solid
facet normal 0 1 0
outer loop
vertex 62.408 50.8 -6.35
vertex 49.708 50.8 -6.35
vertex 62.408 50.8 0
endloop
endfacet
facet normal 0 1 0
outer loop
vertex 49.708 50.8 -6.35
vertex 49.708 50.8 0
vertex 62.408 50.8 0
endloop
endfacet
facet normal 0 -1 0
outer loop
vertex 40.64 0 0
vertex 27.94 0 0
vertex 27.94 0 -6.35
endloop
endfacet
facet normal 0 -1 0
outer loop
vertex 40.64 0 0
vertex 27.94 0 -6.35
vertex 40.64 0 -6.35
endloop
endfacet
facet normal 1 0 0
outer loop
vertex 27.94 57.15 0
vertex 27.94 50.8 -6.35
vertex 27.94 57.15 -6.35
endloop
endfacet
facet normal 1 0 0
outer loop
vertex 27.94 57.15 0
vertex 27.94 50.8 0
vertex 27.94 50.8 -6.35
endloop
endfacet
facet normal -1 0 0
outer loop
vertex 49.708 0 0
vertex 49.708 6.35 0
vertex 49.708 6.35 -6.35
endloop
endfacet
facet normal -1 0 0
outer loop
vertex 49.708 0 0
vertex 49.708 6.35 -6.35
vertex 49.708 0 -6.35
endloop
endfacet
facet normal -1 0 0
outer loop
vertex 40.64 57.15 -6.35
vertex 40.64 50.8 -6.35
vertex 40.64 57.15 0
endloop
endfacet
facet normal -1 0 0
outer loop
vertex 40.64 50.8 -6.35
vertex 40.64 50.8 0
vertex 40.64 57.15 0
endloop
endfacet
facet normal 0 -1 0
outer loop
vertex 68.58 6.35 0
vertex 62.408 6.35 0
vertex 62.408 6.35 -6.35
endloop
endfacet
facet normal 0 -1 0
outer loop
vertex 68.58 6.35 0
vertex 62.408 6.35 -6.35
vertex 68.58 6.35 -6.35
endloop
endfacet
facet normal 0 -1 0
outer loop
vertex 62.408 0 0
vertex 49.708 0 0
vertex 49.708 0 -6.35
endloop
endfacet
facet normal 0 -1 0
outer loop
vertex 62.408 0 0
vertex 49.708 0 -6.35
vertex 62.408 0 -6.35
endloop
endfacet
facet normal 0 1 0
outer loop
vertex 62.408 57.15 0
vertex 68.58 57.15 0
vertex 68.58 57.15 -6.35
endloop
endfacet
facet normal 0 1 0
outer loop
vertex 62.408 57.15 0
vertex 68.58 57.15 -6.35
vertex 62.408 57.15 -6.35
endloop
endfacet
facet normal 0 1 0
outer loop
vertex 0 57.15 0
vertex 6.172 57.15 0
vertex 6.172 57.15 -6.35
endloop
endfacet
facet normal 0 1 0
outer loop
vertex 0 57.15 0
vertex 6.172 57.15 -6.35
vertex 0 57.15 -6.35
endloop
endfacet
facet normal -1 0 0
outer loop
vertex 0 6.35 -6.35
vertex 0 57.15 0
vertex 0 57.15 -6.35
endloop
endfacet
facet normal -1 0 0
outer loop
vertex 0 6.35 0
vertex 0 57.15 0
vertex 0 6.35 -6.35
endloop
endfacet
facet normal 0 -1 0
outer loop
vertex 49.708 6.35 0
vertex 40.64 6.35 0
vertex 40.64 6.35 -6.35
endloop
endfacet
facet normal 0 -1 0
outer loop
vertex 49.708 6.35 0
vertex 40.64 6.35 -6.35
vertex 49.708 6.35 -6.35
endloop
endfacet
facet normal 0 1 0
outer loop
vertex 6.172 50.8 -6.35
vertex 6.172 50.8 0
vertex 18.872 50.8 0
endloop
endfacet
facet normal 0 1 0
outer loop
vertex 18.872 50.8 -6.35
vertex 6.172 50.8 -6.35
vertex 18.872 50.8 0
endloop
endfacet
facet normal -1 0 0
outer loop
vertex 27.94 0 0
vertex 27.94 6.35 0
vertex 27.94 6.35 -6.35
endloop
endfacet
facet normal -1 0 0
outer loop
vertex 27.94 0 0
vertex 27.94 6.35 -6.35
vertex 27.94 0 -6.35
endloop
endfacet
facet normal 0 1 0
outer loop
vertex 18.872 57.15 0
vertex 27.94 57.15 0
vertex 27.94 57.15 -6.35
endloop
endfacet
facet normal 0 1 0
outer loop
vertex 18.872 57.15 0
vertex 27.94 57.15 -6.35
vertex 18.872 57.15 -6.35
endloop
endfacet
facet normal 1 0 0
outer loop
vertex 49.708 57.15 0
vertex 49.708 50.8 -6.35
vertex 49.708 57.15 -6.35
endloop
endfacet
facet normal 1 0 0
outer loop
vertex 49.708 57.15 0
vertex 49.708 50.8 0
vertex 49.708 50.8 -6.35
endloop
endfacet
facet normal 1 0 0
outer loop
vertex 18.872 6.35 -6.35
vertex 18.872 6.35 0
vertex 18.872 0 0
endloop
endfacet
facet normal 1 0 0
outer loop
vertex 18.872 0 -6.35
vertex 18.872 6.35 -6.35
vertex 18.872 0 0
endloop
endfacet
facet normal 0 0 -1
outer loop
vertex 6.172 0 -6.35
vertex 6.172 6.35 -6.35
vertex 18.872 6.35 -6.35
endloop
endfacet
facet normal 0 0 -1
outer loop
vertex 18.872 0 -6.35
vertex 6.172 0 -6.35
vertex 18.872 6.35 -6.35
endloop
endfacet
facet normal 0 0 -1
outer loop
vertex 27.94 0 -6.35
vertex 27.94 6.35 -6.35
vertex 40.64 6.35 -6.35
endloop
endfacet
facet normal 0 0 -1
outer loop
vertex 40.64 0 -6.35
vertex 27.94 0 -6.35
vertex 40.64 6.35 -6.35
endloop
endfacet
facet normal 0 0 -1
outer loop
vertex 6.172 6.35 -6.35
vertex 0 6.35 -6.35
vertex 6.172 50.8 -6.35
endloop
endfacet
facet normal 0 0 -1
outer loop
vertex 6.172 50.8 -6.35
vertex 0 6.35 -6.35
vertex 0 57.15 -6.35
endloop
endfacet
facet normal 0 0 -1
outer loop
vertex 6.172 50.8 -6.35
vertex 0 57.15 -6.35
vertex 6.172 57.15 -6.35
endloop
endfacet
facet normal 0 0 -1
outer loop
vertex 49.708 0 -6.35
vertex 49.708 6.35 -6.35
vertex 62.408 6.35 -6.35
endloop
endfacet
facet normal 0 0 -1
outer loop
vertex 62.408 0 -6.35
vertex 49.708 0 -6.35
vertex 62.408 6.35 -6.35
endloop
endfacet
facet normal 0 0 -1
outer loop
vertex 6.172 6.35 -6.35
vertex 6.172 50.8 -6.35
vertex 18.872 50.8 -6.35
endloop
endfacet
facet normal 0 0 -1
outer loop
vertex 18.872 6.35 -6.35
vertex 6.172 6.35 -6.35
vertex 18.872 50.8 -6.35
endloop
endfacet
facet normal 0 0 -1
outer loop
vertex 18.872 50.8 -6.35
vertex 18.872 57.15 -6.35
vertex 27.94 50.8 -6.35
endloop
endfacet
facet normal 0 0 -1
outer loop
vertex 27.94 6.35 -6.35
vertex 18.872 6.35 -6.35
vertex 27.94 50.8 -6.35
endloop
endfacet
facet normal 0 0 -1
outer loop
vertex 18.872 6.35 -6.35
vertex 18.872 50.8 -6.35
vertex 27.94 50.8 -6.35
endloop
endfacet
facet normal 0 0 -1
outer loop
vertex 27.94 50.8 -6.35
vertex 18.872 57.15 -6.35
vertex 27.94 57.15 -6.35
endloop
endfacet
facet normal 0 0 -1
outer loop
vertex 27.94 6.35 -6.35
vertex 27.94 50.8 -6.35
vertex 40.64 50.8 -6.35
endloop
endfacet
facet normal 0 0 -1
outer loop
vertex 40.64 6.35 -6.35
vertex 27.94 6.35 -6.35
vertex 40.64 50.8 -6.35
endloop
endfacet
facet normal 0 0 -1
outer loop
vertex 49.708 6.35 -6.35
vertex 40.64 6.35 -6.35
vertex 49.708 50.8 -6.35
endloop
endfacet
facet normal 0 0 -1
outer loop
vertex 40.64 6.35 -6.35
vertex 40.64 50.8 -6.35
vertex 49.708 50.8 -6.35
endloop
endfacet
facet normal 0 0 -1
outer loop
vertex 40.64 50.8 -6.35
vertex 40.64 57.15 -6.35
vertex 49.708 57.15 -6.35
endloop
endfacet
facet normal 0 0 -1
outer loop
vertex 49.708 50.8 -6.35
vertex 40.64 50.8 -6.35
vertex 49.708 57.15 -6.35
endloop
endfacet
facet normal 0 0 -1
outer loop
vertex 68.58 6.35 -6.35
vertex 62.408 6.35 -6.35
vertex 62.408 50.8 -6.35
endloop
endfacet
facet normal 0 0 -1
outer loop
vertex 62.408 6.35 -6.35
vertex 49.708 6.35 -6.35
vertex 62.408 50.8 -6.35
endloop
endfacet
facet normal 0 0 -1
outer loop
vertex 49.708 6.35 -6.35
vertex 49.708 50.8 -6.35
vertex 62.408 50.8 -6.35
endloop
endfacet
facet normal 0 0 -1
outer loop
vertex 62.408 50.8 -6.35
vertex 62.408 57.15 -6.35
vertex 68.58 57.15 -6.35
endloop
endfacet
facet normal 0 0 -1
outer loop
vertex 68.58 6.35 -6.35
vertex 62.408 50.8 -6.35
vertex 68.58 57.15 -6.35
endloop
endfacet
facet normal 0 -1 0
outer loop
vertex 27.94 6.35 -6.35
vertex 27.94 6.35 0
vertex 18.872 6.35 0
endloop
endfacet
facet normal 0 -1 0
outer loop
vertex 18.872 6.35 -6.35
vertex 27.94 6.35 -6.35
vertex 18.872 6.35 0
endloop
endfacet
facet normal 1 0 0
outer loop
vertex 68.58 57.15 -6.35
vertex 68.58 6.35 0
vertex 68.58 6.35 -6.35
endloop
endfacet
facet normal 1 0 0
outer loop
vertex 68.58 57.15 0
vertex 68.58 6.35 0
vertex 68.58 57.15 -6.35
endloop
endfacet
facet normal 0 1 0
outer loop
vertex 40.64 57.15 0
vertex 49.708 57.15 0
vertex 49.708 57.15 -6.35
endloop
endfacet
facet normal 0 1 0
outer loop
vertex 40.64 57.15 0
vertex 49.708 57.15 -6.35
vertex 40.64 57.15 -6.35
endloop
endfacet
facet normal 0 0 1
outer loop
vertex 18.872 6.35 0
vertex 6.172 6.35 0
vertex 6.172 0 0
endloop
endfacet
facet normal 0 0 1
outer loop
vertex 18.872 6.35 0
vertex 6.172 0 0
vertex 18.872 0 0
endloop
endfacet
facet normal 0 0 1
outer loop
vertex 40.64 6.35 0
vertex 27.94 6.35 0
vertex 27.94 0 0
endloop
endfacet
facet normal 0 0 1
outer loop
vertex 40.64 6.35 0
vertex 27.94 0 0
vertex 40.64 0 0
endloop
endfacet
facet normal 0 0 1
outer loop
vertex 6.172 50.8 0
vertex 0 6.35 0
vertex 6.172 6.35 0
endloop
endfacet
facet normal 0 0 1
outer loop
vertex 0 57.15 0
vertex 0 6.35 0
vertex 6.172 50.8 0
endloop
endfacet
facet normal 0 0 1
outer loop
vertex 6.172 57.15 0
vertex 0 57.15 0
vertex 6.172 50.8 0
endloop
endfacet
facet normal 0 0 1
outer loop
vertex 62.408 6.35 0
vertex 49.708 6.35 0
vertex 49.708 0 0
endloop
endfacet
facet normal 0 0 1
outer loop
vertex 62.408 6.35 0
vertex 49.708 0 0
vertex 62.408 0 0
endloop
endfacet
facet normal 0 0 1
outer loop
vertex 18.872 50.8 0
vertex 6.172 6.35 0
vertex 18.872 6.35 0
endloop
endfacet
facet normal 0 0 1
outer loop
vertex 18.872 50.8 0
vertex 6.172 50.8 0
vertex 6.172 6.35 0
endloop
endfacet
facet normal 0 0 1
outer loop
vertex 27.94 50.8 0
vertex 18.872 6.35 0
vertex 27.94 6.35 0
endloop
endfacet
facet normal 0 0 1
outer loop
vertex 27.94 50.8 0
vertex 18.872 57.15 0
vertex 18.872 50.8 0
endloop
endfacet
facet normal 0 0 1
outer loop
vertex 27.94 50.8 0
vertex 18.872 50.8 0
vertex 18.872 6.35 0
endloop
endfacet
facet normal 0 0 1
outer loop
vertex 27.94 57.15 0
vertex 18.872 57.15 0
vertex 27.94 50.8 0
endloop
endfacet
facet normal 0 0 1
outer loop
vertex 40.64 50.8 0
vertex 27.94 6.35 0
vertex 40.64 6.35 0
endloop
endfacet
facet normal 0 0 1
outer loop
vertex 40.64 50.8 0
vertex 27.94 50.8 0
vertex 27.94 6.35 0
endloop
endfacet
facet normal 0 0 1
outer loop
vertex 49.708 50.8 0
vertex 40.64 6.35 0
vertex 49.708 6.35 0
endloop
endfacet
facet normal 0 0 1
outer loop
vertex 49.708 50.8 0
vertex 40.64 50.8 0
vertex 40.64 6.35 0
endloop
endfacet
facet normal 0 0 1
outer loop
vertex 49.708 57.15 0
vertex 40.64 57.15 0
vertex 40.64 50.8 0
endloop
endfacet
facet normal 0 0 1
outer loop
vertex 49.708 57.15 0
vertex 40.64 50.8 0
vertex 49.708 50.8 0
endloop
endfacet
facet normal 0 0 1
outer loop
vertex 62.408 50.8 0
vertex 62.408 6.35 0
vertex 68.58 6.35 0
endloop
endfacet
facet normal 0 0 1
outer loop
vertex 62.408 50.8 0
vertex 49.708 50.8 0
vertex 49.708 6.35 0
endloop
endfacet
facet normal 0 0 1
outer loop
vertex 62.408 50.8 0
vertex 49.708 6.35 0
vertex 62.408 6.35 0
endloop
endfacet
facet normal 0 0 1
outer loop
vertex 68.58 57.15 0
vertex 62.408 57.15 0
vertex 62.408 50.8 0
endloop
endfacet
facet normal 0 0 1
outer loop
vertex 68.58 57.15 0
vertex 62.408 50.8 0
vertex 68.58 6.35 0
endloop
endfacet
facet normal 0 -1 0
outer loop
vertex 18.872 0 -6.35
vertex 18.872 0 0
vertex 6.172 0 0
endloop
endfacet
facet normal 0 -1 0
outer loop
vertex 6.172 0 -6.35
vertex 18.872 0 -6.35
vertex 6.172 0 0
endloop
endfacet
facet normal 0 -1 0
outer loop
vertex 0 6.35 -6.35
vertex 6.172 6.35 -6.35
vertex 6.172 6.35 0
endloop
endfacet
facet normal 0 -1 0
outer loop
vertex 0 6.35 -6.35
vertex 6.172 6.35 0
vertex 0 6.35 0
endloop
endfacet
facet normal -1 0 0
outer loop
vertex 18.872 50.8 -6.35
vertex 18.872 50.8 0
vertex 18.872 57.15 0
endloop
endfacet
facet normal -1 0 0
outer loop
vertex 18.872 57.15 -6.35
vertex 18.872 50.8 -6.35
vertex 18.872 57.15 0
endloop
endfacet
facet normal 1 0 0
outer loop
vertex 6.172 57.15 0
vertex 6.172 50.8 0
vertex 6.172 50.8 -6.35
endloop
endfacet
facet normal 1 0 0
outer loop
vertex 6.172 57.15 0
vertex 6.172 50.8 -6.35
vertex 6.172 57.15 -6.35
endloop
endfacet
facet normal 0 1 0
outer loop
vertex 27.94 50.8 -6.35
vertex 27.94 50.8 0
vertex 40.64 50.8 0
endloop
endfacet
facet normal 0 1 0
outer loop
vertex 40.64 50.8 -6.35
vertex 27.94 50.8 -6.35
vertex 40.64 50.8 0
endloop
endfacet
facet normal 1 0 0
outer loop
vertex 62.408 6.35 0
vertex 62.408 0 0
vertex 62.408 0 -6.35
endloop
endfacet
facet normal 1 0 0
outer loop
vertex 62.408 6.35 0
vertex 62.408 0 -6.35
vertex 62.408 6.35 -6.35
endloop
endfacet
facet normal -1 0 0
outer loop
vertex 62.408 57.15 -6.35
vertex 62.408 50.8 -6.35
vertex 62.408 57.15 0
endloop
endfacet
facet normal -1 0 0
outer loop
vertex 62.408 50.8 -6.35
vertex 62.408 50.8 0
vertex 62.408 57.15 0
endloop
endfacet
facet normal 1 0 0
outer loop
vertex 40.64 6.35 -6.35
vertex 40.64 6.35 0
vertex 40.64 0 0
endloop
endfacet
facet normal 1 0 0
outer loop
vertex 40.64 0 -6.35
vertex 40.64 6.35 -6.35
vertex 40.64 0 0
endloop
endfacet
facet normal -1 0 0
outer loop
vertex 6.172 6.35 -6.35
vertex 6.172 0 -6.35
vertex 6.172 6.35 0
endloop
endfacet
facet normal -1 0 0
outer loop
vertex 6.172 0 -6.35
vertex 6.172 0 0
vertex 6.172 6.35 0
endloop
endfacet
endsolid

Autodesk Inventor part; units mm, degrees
ref_plane "YZ Plane" through (0, 0, 0) normal (1, 0, 0) x (0, 1, 0)
ref_plane "XZ Plane" through (0, 0, 0) normal (0, 1, 0) x (-1, 0, 0)
ref_plane "XY Plane" through (0, 0, 0) normal (0, 0, 1) x (1, 0, 0)
sketch "Sketch1" plane through (0, 0, 0) normal (0, 0, 1) x (1, 0, 0)
  line L0 (68.58, 6.35) -> (68.58, 57.15)
  line L1 (68.58, 57.15) -> (0, 57.15)
  line L2 (0, 57.15) -> (0, 6.35)
  line L3 (40.64, 6.35) -> (40.64, 0)
  line L4 (27.94, 6.35) -> (27.94, 0)
  line L5 (27.94, 0) -> (40.64, 0)
  line L6 (27.94, 6.35) -> (18.8722, 6.35)
  line L7 (18.8722, 6.35) -> (18.8722, 0)
  line L8 (18.8722, 0) -> (6.1722, 0)
  line L9 (6.1722, 0) -> (6.1722, 6.35)
  line L10 (40.64, 6.35) -> (49.7078, 6.35)
  line L11 (49.7078, 6.35) -> (49.7078, 0)
  line L12 (49.7078, 0) -> (62.4078, 0)
  line L13 (62.4078, 0) -> (62.4078, 6.35)
  line L14 (6.1722, 0) -> (18.8722, 0)
  line L15 (27.94, 0) -> (40.64, 0)
  line L16 (49.7078, 0) -> (62.4078, 0)
  line L17 (27.94, 6.35) -> (18.8722, 6.35)
  line L18 (6.1722, 6.35) -> (0, 6.35)
  line L19 (40.64, 6.35) -> (49.7078, 6.35)
  line L20 (62.4078, 6.35) -> (68.58, 6.35)
  point P0 (0, 0)
  dimension "d0" = 68.58
  dimension "d1" = 50.8
extrude "Extrusion1" add sketch "Sketch1" against normal blind 6.35
sketch "Sketch2" plane through (0, 0, 0) normal (0, 0, 1) x (1, 0, 0)
  line L0 (0, 6.35) -> (6.1722, 6.35) projected
  line L1 (6.1722, 50.8) -> (6.1722, 57.15)
  line L2 (0, 57.15) -> (68.58, 57.15) projected
  line L3 (49.7078, 6.35) -> (40.64, 6.35) projected
  line L4 (40.64, 50.8) -> (40.64, 57.15)
  line L5 (18.8722, 0) -> (18.8722, 6.35) projected
  line L6 (18.8722, 50.8) -> (18.8722, 57.15)
  line L7 (27.94, 0) -> (27.94, 6.35) projected
  line L8 (27.94, 50.8) -> (27.94, 57.15)
  line L9 (49.7078, 50.8) -> (49.7078, 57.15)
  line L10 (68.58, 6.35) -> (62.4078, 6.35) projected
  line L11 (62.4078, 50.8) -> (62.4078, 57.15)
  line L12 (0, 57.15) -> (0, 50.8)
  line L13 (68.58, 57.15) -> (68.58, 6.35) projected
  line L14 (49.7078, 50.8) -> (62.4078, 50.8)
  line L15 (6.1722, 50.8) -> (18.8722, 50.8)
  line L16 (27.94, 50.8) -> (40.64, 50.8)
  line L17 (27.94, 57.15) -> (40.64, 57.15)
  point P0 (0, 0)
extrude "Extrusion2" cut sketch "Sketch2" against normal blind 6.35
properties part number "flat-no-recess"
